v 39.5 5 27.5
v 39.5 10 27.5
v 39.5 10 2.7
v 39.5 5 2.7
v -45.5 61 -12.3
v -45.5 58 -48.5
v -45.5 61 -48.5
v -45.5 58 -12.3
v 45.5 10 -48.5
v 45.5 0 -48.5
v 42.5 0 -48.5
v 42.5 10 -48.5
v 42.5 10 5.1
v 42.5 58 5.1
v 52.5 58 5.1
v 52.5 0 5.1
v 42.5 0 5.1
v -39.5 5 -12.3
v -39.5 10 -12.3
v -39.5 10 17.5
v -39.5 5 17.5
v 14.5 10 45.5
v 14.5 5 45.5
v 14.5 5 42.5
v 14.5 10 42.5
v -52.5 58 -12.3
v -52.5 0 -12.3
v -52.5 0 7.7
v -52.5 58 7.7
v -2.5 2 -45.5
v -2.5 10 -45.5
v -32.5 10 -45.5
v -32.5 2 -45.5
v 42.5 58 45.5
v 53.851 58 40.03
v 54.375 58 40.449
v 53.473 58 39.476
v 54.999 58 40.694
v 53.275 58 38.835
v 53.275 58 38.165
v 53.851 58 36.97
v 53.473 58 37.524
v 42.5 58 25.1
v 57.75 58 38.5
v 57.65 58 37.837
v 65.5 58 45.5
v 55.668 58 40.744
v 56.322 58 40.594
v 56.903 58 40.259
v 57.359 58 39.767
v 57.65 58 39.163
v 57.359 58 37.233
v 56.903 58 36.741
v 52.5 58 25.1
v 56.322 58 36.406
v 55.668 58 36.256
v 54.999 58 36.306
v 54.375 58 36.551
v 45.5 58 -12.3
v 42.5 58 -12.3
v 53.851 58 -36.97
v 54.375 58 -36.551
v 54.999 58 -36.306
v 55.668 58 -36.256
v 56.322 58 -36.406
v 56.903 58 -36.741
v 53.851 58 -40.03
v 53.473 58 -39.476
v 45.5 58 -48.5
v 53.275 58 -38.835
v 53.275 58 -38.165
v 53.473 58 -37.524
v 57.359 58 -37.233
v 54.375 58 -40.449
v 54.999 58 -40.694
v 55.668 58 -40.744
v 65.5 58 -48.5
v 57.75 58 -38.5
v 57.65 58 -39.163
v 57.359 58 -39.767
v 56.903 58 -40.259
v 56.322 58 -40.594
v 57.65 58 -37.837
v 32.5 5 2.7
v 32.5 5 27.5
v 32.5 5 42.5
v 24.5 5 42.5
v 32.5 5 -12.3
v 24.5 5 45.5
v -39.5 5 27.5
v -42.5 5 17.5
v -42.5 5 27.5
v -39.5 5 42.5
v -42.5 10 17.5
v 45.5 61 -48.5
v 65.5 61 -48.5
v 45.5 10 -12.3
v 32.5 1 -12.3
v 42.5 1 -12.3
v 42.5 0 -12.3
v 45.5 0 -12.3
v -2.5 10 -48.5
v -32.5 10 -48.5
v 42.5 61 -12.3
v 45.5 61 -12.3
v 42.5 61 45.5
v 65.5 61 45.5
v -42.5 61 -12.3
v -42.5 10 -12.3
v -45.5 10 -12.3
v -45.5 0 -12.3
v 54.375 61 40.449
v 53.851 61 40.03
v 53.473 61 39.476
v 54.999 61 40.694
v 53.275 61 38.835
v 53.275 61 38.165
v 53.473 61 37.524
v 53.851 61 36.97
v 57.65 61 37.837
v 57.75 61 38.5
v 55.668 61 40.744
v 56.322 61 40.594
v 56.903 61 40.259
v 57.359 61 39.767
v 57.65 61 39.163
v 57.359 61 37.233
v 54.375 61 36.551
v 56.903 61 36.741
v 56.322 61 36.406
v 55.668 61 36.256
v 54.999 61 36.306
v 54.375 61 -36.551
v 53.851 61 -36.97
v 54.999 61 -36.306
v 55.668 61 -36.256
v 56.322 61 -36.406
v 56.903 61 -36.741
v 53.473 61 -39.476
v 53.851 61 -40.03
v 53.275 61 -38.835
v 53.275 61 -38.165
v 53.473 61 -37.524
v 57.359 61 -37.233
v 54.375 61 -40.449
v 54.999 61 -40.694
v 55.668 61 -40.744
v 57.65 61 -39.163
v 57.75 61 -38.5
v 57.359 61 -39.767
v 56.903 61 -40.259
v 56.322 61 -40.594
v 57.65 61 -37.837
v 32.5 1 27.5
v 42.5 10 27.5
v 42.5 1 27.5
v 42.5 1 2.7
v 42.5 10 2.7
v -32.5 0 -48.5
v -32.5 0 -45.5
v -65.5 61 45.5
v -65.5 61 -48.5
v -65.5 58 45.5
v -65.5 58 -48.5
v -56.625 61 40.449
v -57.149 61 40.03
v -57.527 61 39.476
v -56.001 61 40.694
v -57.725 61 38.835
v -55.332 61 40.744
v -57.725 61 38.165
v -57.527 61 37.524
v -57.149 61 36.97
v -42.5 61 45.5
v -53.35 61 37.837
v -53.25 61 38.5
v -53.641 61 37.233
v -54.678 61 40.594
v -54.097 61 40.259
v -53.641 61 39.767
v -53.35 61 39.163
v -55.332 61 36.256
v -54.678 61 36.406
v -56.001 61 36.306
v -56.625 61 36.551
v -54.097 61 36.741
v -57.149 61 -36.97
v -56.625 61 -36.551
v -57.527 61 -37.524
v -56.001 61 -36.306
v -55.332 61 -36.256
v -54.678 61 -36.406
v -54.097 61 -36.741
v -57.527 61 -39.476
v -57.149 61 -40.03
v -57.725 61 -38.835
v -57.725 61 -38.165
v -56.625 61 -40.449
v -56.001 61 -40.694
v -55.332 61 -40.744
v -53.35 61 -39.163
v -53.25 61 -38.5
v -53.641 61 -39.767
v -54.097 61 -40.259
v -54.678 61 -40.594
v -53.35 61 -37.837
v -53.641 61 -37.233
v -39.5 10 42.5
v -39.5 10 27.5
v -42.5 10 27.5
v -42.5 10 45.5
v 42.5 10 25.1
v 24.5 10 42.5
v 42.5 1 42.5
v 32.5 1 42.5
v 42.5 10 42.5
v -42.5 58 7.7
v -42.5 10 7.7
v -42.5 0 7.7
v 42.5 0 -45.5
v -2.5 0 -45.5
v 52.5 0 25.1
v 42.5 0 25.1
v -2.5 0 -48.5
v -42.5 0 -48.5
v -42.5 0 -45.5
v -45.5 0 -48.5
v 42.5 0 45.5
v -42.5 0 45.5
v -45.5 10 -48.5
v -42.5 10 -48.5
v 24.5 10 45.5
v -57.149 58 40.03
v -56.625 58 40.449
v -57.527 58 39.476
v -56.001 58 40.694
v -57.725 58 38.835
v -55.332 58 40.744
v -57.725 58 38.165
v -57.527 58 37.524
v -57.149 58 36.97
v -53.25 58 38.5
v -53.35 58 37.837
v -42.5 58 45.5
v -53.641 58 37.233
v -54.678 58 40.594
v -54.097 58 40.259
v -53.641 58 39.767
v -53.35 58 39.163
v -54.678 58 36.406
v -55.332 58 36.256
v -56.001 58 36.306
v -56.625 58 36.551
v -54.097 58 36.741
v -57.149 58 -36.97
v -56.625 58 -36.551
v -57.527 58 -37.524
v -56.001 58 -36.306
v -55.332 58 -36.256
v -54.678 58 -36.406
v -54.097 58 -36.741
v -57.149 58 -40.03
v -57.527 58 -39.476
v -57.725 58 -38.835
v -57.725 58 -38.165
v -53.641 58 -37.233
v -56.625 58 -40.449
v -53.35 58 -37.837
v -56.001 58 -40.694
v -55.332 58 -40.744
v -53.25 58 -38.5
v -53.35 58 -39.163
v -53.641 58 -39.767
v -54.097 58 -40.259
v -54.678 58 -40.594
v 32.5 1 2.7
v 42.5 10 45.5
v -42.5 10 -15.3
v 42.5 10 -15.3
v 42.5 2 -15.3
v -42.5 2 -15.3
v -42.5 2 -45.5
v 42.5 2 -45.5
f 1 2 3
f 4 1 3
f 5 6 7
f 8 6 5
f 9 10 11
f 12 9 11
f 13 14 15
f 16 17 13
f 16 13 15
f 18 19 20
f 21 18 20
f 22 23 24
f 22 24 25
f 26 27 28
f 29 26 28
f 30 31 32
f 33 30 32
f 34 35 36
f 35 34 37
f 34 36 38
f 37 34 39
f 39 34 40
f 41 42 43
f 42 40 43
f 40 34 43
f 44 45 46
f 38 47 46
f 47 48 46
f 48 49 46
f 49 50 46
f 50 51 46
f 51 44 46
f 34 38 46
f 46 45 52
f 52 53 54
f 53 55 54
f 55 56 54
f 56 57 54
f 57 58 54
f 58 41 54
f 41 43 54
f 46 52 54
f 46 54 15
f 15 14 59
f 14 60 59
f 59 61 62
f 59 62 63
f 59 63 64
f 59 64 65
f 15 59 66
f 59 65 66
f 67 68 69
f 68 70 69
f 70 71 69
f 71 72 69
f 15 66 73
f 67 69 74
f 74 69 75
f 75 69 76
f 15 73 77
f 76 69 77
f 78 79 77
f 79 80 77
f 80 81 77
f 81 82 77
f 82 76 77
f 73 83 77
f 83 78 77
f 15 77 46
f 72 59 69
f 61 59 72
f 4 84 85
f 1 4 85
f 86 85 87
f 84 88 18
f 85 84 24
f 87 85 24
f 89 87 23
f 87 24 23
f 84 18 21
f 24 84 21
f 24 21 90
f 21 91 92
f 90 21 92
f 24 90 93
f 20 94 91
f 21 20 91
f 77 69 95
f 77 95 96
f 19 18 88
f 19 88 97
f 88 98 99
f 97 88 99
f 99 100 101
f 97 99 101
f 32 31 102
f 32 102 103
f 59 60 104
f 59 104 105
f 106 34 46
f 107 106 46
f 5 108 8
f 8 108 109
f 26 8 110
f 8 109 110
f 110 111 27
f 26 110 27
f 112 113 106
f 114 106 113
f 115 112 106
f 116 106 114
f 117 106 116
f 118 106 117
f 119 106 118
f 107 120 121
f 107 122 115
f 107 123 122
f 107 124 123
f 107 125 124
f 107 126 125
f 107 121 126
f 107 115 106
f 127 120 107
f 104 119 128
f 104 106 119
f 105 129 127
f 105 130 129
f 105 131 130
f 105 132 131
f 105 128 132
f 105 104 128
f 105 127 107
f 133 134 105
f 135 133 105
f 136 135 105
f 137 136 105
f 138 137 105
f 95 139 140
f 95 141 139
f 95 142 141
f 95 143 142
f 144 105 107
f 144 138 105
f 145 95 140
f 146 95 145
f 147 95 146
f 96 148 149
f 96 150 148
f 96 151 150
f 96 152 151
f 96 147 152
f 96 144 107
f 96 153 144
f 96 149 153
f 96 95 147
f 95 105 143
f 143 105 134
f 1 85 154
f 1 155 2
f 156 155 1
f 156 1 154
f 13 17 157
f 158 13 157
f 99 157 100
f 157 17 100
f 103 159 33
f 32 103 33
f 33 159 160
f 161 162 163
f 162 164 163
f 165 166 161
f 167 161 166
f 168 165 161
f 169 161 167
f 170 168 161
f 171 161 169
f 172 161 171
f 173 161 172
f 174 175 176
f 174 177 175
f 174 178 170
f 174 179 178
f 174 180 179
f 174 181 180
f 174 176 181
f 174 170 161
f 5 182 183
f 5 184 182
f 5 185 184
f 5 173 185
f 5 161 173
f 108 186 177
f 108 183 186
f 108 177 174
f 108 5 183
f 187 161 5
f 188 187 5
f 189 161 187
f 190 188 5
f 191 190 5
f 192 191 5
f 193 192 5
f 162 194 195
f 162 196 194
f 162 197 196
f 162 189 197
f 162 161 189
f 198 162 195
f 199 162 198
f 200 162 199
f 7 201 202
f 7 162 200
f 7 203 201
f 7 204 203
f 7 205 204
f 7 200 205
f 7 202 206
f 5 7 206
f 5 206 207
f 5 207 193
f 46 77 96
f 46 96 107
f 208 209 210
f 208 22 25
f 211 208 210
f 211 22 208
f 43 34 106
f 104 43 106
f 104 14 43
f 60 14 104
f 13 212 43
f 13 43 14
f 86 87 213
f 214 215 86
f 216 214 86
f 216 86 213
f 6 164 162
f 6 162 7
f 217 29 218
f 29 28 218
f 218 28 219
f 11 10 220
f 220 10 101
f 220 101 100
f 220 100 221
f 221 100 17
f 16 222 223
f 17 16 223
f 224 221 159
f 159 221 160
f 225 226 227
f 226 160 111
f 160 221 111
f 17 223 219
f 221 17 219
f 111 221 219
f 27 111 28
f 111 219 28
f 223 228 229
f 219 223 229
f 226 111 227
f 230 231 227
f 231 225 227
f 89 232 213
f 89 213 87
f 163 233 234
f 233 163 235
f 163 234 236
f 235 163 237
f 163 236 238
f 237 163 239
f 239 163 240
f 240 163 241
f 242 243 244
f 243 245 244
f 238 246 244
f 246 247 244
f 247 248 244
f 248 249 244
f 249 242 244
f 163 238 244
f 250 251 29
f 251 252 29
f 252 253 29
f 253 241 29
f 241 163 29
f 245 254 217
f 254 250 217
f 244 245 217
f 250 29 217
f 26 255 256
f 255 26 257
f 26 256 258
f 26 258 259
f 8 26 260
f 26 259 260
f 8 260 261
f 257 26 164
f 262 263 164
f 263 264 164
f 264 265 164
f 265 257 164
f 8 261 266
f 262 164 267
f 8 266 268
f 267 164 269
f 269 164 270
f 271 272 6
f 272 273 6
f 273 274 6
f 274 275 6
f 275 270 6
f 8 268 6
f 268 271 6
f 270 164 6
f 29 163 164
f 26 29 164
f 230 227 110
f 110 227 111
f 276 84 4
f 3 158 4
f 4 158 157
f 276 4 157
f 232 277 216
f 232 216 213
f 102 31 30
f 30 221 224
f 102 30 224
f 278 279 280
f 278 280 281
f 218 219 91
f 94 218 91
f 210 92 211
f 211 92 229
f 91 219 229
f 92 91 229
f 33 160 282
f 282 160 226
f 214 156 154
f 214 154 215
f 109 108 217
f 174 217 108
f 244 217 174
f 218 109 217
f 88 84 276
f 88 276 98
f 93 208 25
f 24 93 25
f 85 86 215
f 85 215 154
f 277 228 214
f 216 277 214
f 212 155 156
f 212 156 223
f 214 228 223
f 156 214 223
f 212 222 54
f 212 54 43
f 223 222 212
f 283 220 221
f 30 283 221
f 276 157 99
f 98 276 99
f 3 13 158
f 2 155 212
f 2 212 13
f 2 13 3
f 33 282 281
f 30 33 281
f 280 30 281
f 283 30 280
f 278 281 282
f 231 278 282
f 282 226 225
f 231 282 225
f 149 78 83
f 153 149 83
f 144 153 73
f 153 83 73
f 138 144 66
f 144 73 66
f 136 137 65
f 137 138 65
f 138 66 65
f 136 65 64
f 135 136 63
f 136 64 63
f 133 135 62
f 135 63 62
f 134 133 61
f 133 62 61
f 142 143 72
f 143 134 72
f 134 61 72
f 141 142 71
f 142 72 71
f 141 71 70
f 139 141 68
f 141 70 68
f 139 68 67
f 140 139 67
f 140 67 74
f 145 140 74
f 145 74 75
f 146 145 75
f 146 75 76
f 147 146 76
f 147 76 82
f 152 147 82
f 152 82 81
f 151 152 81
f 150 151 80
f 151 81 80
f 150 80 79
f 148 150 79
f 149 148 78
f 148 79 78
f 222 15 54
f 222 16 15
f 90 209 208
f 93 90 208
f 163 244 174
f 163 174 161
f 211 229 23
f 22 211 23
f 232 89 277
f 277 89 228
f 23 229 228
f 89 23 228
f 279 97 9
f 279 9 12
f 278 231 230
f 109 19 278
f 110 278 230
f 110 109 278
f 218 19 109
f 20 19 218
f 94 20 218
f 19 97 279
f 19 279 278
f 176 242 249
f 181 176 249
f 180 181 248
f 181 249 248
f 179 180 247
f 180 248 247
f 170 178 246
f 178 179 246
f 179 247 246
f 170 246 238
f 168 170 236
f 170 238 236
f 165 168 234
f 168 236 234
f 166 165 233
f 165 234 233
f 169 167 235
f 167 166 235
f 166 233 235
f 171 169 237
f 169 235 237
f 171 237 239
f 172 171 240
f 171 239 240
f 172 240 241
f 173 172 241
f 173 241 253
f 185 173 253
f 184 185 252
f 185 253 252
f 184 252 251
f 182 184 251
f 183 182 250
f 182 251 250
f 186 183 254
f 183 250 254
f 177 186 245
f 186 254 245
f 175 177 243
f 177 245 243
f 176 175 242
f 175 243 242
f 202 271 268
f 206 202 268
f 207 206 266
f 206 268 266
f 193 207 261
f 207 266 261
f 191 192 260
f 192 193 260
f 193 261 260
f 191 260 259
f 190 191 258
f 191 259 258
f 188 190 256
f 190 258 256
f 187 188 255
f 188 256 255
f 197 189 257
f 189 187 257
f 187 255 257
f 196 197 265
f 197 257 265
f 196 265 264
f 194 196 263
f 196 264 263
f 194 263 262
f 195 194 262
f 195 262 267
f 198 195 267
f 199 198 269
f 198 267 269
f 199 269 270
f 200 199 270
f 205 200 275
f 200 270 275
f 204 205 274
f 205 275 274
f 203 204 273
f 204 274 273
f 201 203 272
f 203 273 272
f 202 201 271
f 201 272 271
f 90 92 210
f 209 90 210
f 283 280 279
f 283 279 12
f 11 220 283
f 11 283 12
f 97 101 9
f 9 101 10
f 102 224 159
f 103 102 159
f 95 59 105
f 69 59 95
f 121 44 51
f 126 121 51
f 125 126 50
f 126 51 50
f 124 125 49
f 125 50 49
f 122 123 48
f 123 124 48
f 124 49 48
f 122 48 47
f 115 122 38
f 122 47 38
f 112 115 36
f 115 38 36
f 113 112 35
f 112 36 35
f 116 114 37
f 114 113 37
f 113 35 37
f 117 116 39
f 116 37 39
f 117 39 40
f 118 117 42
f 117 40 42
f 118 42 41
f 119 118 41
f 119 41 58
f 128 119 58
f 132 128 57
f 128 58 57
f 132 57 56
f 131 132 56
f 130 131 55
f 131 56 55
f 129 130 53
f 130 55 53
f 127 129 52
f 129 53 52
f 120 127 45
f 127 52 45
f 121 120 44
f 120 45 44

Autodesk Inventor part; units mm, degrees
ref_plane "YZ Plane" through (0, 0, 0) normal (1, 0, 0) x (0, 1, 0)
ref_plane "XZ Plane" through (0, 0, 0) normal (0, 1, 0) x (-1, 0, 0)
ref_plane "XY Plane" through (0, 0, 0) normal (0, 0, 1) x (1, 0, 0)
sketch "Boceto1" plane through (0, 0, 0) normal (0, 1, 0) x (-1, 0, 0)
  line L0 (39.5, 42.5) -> (-39.5, 42.5)
  line L1 (-39.5, 42.5) -> (-39.5, -42.5)
  line L2 (-39.5, -42.5) -> (39.5, -42.5)
  line L3 (39.5, -42.5) -> (39.5, 42.5)
  line L4 (39.5, 42.5) -> (-39.5, -42.5) construction
  line L5 (-39.5, 42.5) -> (39.5, -42.5) construction
  line L6 (42.5, 45.5) -> (-42.5, 45.5)
  line L7 (-42.5, 45.5) -> (-42.5, -45.5)
  line L8 (-42.5, -45.5) -> (42.5, -45.5)
  line L9 (42.5, -45.5) -> (42.5, 45.5)
  point P0 (0, 0)
  point P1 (0, 0)
  dimension "d0" = 79
  dimension "d1" = 85
  dimension "d2" = 3
extrude "Extrusión1" add sketch "Boceto1" along normal blind 10 contours L3 L2 L1 L0 | L9 L8 L7 L6
sketch "Boceto2" plane through (0, 10, 0) normal (0, 1, 0) x (1, 0, 0)
  line L0 (-42.5, 45.5) -> (-42.5, -45.5)
  line L1 (42.5, -45.5) -> (-42.5, -45.5)
  line L2 (-42.5, -45.5) -> (-42.5, 45.5)
  line L3 (-42.5, 45.5) -> (42.5, 45.5)
  line L4 (42.5, 45.5) -> (42.5, -45.5)
  line L5 (42.5, -45.5) -> (-42.5, 45.5) construction
  line L6 (-42.5, -45.5) -> (42.5, 45.5) construction
  line L7 (-39.5, -42.5) -> (39.5, -42.5)
  line L8 (39.5, -42.5) -> (39.5, 42.5)
  line L9 (39.5, 42.5) -> (-39.5, 42.5)
  line L10 (-39.5, 42.5) -> (-39.5, -42.5)
  line L11 (0, -42.5) -> (0, -45.5)
  line L12 (-42.5, -45.5) -> (42.5, -45.5)
  line L13 (-15, -45.5) -> (15, -45.5)
  line L14 (15, -45.5) -> (15, -42.5)
  line L15 (15, -42.5) -> (-15, -42.5)
  line L16 (-15, -42.5) -> (-15, -45.5)
  line L17 (-15, -45.5) -> (15, -42.5) construction
  line L18 (15, -45.5) -> (-15, -42.5) construction
  line L19 (-65.3363, 15.3) -> (96.4695, 15.3)
  point P0 (0, 0)
  point P1 (0, -44)
  point P2 (39.5, 15.3)
  point P3 (-39.5, 15.3)
  dimension "d8" = 3
  dimension "d9" = 85
  dimension "d10" = 79
  dimension "d11" = 30
  dimension "d12" = 57.8
extrude "Extrusión2" cut sketch "Boceto2" against normal blind 5 contours L19 L8 L7 L10
sketch "Boceto3" plane through (0, 0, 0) normal (0, 1, 0) x (-1, 0, 0)
  line L0 (-42.5, 45.5) -> (-42.5, -15.3)
  line L1 (42.5, -45.5) -> (-42.5, -45.5)
  line L2 (-42.5, -45.5) -> (-42.5, -15.3)
  line L3 (-42.5, -15.3) -> (42.5, -15.3)
  line L4 (42.5, -15.3) -> (42.5, -45.5)
  line L5 (-45.5, -48.5) -> (45.5, -48.5)
  line L6 (45.5, -48.5) -> (45.5, -12.3)
  line L7 (45.5, -12.3) -> (-45.5, -12.3)
  line L8 (-45.5, -12.3) -> (-45.5, -48.5)
  line L9 (45.5, -15.3) -> (-45.5, -15.3)
  line L10 (-12.5, -48.5) -> (-12.5, -45.5)
  line L11 (-42.5, -45.5) -> (42.5, -45.5)
  line L12 (42.5, -45.5) -> (42.5, -48.5)
  line L13 (42.5, -15.3) -> (42.5, -12.3)
  line L14 (42.5, -45.5) -> (42.5, 45.5)
  line L15 (-42.5, -15.3) -> (-42.5, -12.3)
  line L16 (-42.5, 45.5) -> (-42.5, -45.5) projected
  line L17 (-42.5, -45.5) -> (-42.5, -48.5)
  line L18 (-42.5, -45.5) -> (42.5, -45.5) projected
  line L19 (2.5, -48.5) -> (32.5, -48.5)
  line L20 (32.5, -48.5) -> (32.5, -45.5)
  line L21 (32.5, -45.5) -> (2.5, -45.5)
  line L22 (2.5, -45.5) -> (2.5, -48.5)
  point P0 (0, 0)
  point P1 (0, 0)
  point P2 (-12.5, -47)
  point P3 (2.5, -45.5)
  point P4 (42.5, -47)
  point P5 (32.5, -47)
  dimension "d15" = 3
  dimension "d16" = 30
  dimension "d21" = 30
  dimension "d24" = 10
extrude "Extrusión3" add sketch "Boceto3" along normal blind 10 contours L7 L13 L3 L0 | L0 L9 L8 L7 | L3 L4 L1 L2 | L2 L17 L5 L8 L9 | L7 L6 L9 L13 | L9 L6 L5 L12 L4 | L1 L20 L5 L22
sketch "Boceto4" plane through (0, 10, 0) normal (0, 1, 0) x (1, 0, 0)
  line L0 (-39.5, 15.3) -> (39.5, 15.3)
  line L1 (0, 15.3) -> (0, 45.5)
  line L2 (42.5, 45.5) -> (-42.5, 45.5)
  line L3 (-42.5, 45.5) -> (42.5, 45.5)
  line L4 (42.5, 45.5) -> (42.5, 15.3)
  line L5 (42.5, 15.3) -> (-42.5, 15.3)
  line L6 (-42.5, 15.3) -> (-42.5, 45.5)
  line L7 (-42.5, 45.5) -> (42.5, 15.3) construction
  line L8 (42.5, 45.5) -> (-42.5, 15.3) construction
  point P0 (0, 0)
  point P1 (0, 0)
  point P2 (0, 30.4)
extrude "Extrusión4" cut sketch "Boceto4" against normal blind 8
sketch "Boceto5" plane through (-42.5, 0, 45.5) normal (-1, 0, 0) x (0, 0, 1)
  line L0 (-18, 10) -> (-28, 10)
  line L1 (-28, 10) -> (-28, 5)
  line L2 (-28, 5) -> (-18, 5)
  line L3 (-18, 5) -> (-18, 10)
  line L4 (-3, 5) -> (-57.8, 5) projected
  line L5 (-3, 10) -> (-3, 5) projected
  line L6 (-57.8, 10) -> (0, 10) projected
  point P0 (-45.5, 0)
  point P1 (-23, 5)
  dimension "d25" = 10
  dimension "d27" = 15
  dimension "d28" = 0
  dimension "d29" = 0
extrude "Extrusión5" cut sketch "Boceto5" against normal blind 10 contours L3 L2 L1 L0
sketch "Boceto6" plane through (-42.5, 0, 45.5) normal (0, 0, 1) x (1, 0, 0)
  line L0 (67, 5) -> (57, 5)
  line L1 (57, 5) -> (57, 10)
  line L2 (57, 10) -> (67, 10)
  line L3 (67, 10) -> (67, 5)
  line L4 (82, 5) -> (3, 5) projected
  line L5 (85, 0) -> (85, 10) projected
  line L6 (0, 10) -> (85, 10) projected
  point P0 (42.5, 0)
  point P1 (62, 5)
  dimension "d32" = 10
  dimension "d33" = 18
  dimension "d34" = 0
  dimension "d35" = 0
extrude "Extrusión6" cut sketch "Boceto6" against normal blind 10
sketch "Boceto7" plane through (42.5, 0, 45.5) normal (1, 0, 0) x (0, 0, -1)
  line L0 (57.8, 10) -> (3, 10) projected
  line L1 (3, 10) -> (18, 10)
  line L2 (18, 10) -> (18, 1)
  line L3 (18, 1) -> (3, 1)
  line L4 (3, 1) -> (3, 10)
  line L5 (3, 10) -> (3, 5) projected
  line L6 (57.8, 10) -> (28, 10) projected
  line L7 (57.8, 10) -> (42.8, 10)
  line L8 (42.8, 10) -> (42.8, 1)
  line L9 (42.8, 1) -> (57.8, 1)
  line L10 (57.8, 1) -> (57.8, 10)
  point P0 (45.5, 0)
  point P1 (0, 10)
  dimension "d41" = 15
  dimension "d42" = 9
  dimension "d43" = 0
  dimension "d46" = 15
  dimension "d47" = 9
extrude "Extrusión7" cut sketch "Boceto7" against normal blind 10
sketch "Boceto8" plane through (0, 0, 0) normal (0, 1, 0) x (-1, 0, 0)
  line L0 (42.5, -12.3) -> (42.5, 45.5) projected
  line L1 (42.5, -12.3) -> (52.5, -12.3)
  line L2 (52.5, -12.3) -> (52.5, 7.7)
  line L3 (52.5, 7.7) -> (42.5, 7.7)
  line L4 (42.5, 7.7) -> (42.5, -12.3)
  line L5 (45.5, -12.3) -> (42.5, -12.3) projected
  line L6 (-42.5, 45.5) -> (-42.5, -12.3) projected
  line L7 (-42.5, 5.1) -> (-52.5, 5.1)
  line L8 (-52.5, 5.1) -> (-52.5, 25.1)
  line L9 (-52.5, 25.1) -> (-42.5, 25.1)
  line L10 (-42.5, 25.1) -> (-42.5, 5.1)
  line L11 (-42.5, 2.7) -> (-39.5, 2.7) projected
  line L12 (-39.5, 27.5) -> (-42.5, 27.5) projected
  point P0 (0, 0)
  dimension "d48" = 10
  dimension "d49" = 20
  dimension "d50" = 0
  dimension "d51" = 10
  dimension "d52" = 20
  dimension "d53" = 2.4
  dimension "d54" = 2.4
extrude "Extrusión8" add sketch "Boceto8" along normal blind 58
sketch "Boceto9" plane through (0, 58, 0) normal (0, 1, 0) x (1, 0, 0)
  line L0 (-69.4566, 48.5) -> (100.0188, 48.5)
  line L1 (45.5, 48.5) -> (12.5, 48.5)
  line L2 (-42.5, -45.5) -> (42.5, -45.5)
  line L3 (-42.5, -45.5) -> (-83.2167, -45.5)
  line L4 (-83.2167, -45.5) -> (109.2502, -45.5)
  line L5 (65.5, 48.5) -> (65.5, -45.5)
  line L6 (45.5, 12.3) -> (45.5, 48.5)
  circle A0 centre (55.5, 38.5) radius 2.25
  line L7 (65.5, 0) -> (100.0188, 0)
  circle A1 centre (55.5, -38.5) radius 2.25
  line L8 (0, -45.5) -> (0, -59.2916)
  line L9 (-65.5, 48.5) -> (-65.5, -45.5)
  circle A2 centre (-55.5, -38.5) radius 2.25
  circle A3 centre (-55.5, 38.5) radius 2.25
  line L10 (-42.5, 12.3) -> (-42.5, -45.5)
  line L11 (-42.5, -45.5) -> (-42.5, 12.3)
  line L12 (-45.5, 12.3) -> (-42.5, 12.3)
  line L13 (-42.5, 12.3) -> (-45.5, 12.3)
  line L14 (-45.5, 48.5) -> (-45.5, 12.3)
  line L15 (-45.5, 12.3) -> (-45.5, 48.5)
  line L16 (-45.5, 48.5) -> (-65.5, 48.5)
  line L17 (42.5, 12.3) -> (45.5, 12.3)
  line L18 (45.5, 48.5) -> (45.5, 12.3)
  line L19 (45.5, 12.3) -> (42.5, 12.3)
  line L20 (15, -45.5) -> (42.5, -45.5)
  line L21 (42.5, 12.3) -> (42.5, -45.5)
  line L22 (42.5, -45.5) -> (65.5, -45.5)
  point P0 (0, 0)
  point P1 (0, 0)
  dimension "d57" = 20
  dimension "d58" = 4.5
  dimension "d59" = 10
  dimension "d60" = 10
extrude "Extrusión9" add sketch "Boceto9" along normal blind 3 contours L0 L14 L12 L10 L3 L9 | L0 L5 L4 L21 L17 L6
properties part number "batter_pack_top"
